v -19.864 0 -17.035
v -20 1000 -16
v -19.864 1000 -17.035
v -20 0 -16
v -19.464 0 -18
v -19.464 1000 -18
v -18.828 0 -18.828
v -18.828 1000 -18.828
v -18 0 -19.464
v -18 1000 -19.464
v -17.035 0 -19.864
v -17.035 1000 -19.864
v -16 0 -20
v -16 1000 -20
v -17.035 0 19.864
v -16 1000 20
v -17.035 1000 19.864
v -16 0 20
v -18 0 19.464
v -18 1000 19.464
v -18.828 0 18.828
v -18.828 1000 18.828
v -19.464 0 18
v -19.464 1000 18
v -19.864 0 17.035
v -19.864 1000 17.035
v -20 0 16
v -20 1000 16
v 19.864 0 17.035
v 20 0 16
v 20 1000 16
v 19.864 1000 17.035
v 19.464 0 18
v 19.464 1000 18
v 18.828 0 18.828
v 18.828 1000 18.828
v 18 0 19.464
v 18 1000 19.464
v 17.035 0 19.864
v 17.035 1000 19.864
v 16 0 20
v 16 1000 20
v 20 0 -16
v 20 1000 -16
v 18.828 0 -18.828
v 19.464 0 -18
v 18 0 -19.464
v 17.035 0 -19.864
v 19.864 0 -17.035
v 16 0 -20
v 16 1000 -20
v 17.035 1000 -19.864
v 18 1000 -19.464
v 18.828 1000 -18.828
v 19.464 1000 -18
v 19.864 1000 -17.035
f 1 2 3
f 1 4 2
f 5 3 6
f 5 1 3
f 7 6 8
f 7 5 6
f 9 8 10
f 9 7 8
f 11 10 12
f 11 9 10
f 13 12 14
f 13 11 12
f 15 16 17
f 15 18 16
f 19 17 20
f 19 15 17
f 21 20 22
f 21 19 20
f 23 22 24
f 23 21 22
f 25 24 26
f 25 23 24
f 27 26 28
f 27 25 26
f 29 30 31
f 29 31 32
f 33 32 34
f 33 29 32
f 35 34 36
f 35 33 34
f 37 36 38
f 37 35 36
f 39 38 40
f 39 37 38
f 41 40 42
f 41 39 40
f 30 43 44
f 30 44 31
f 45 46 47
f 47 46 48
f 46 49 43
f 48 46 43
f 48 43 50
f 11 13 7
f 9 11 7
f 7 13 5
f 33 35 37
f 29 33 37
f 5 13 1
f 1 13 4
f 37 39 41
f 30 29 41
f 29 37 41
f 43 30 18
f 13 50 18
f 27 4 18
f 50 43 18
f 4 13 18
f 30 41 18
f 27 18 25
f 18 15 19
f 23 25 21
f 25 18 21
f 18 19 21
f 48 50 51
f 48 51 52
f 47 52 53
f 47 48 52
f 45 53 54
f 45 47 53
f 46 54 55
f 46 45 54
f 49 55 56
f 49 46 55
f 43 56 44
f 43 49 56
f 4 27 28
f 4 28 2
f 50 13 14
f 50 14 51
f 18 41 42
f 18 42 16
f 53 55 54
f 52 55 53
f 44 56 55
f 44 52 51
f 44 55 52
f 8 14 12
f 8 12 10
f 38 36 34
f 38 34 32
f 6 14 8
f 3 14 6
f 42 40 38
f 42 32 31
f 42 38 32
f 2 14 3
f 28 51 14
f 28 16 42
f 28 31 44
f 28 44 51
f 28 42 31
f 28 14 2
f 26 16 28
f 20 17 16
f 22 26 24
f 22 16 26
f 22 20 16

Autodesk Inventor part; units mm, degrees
ref_plane "YZ Plane" through (0, 0, 0) normal (1, 0, 0) x (0, 1, 0)
ref_plane "XZ Plane" through (0, 0, 0) normal (0, 1, 0) x (-1, 0, 0)
ref_plane "XY Plane" through (0, 0, 0) normal (0, 0, 1) x (1, 0, 0)
sketch "Sketch1" plane through (0, 0, 0) normal (0, 1, 0) x (-1, 0, 0)
  line L0 (12.8536, 0) -> (-12.8536, 0) construction
  line L1 (0, -18.0149) -> (0, 18.0149) construction
  line L2 (16, -20) -> (-16, -20)
  line L3 (-20, -16) -> (-20, 16)
  line L4 (-16, 20) -> (16, 20)
  line L5 (20, 16) -> (20, -16)
  arc A0 (-16, 20) -> (-20, 16) centre (-16, 16) ccw
  arc A1 (-20, -16) -> (-16, -20) centre (-16, -16) ccw
  arc A2 (16, -20) -> (20, -16) centre (16, -16) ccw
  arc A3 (20, 16) -> (16, 20) centre (16, 16) ccw
  point P0 (0, 0)
  point P1 (0, 0)
  point P2 (0, 0)
  point P3 (20, -20)
  point P4 (-20, 20)
  point P5 (-20, -20)
  point P6 (20, 20)
  dimension "d0" = 40
  dimension "d1" = 40
  dimension "d2" = 4
extrude "Extrusion1" add sketch "Sketch1" along normal blind 1000
properties part number "Item4040RotorHorizontalTopV1"
